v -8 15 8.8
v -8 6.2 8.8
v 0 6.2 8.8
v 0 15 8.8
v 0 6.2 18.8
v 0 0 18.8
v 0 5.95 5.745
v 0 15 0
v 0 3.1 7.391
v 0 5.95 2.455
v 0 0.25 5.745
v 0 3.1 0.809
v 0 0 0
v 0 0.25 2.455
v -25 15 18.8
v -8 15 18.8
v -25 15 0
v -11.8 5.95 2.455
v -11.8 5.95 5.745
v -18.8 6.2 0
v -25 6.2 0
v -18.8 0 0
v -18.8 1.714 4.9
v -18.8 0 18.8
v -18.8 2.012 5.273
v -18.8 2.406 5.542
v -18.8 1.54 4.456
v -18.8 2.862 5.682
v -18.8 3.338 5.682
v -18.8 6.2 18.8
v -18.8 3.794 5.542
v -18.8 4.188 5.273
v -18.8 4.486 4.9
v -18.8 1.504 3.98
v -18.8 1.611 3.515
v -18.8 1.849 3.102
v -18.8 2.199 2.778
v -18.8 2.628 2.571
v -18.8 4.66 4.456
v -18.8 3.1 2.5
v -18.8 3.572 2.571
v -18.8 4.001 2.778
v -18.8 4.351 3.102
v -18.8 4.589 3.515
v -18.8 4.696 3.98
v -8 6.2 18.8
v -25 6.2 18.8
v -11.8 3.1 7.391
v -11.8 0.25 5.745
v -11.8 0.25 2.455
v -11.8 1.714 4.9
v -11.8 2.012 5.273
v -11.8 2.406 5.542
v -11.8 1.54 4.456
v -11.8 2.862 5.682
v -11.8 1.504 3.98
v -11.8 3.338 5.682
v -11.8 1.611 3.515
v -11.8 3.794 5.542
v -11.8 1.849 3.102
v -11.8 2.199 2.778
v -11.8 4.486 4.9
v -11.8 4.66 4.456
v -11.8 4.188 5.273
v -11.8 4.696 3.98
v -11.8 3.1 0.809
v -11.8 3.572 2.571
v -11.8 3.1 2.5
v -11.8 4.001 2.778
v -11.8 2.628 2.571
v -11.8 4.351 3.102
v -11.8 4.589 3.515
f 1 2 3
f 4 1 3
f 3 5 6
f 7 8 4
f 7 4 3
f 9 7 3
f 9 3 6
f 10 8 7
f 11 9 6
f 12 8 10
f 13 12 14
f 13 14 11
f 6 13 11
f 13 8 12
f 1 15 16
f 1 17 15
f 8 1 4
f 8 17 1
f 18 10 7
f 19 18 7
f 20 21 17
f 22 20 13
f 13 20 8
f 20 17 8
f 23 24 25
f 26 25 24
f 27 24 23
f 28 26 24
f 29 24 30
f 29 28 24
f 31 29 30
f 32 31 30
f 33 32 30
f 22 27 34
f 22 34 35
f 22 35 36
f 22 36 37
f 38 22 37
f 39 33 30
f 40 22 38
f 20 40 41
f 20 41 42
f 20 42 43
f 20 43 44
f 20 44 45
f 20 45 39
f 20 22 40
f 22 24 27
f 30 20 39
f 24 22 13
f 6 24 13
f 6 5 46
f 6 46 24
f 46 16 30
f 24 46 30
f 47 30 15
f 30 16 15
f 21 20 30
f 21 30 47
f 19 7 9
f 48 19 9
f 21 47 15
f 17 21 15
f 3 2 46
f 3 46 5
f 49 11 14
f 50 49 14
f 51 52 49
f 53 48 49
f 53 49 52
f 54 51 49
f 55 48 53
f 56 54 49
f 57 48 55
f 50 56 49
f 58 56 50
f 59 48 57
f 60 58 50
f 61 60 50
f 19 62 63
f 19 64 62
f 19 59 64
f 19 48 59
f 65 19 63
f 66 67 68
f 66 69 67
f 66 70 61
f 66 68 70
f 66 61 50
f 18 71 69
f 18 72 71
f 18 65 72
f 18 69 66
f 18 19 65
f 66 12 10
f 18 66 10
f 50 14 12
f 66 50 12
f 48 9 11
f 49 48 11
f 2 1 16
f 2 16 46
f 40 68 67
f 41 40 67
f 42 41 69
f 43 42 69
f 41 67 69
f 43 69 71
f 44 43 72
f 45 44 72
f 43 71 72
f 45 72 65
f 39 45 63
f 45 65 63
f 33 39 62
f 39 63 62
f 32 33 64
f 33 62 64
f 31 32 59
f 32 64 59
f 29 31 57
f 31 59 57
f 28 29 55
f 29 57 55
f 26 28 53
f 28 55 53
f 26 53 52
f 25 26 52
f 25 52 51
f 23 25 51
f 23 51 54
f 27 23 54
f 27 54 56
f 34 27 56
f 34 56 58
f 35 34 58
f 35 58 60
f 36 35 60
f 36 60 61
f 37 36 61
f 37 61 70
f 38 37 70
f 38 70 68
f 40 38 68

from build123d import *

# Parameters (mm, degrees)
SALIENTE_EXTRUIR1_DEPTH = 8.8
SALIENTE_EXTRUIR2_DEPTH = 10
CORTAR_EXTRUIR1_REACH   = 27
CROQUIS3_R              = 1.6
CORTAR_EXTRUIR2_DEPTH   = 11.8


with BuildPart() as part:
    # Croquis1 → Saliente-Extruir1 (new body)
    with BuildSketch(Plane.XY):
        Polygon((0, 0), (0, 15), (-25, 15), (-25, 6.2), (-18.8, 6.2), (-18.8, 0), align=None)
    extrude(amount=SALIENTE_EXTRUIR1_DEPTH)

    # Croquis2 → Saliente-Extruir2 (add)
    with BuildSketch(Plane.XY.offset(8.8)):
        Polygon((-8, 15), (-8, 6.2), (0, 6.2), (0, 0), (-8, 0), (-18.8, 0), (-18.8, 6.2), (-25, 6.2), (-25, 15), align=None)
    extrude(amount=SALIENTE_EXTRUIR2_DEPTH)

    # Croquis3 → Cortar-Extruir1 (cut, up to next)
    with BuildSketch(Plane(origin=(0, 0, 0), x_dir=(0, 0, -1), z_dir=(1, 0, 0)), mode=Mode.PRIVATE) as cortar_extruir1_sk1:
        with Locations((-4.1, 3.1)):
            Circle(CROQUIS3_R)
    cortar_extruir1_tool1 = extrude(cortar_extruir1_sk1.sketch, amount=-CORTAR_EXTRUIR1_REACH, mode=Mode.PRIVATE) & part.part
    add(cortar_extruir1_tool1.solids().sort_by_distance((0, 3.1, 4.1))[0], mode=Mode.SUBTRACT)

    # Croquis4 → Cortar-Extruir2 (cut)
    with BuildSketch(Plane(origin=(0, 0, 0), x_dir=(0, 0, -1), z_dir=(1, 0, 0))):
        Polygon((-0.809103466, 3.1), (-2.454551733, 5.95), (-5.745448267, 5.95), (-7.390896534, 3.1), (-5.745448267, 0.25), (-2.454551733, 0.25), align=None)
    extrude(amount=-CORTAR_EXTRUIR2_DEPTH, mode=Mode.SUBTRACT)


solid = part.part
